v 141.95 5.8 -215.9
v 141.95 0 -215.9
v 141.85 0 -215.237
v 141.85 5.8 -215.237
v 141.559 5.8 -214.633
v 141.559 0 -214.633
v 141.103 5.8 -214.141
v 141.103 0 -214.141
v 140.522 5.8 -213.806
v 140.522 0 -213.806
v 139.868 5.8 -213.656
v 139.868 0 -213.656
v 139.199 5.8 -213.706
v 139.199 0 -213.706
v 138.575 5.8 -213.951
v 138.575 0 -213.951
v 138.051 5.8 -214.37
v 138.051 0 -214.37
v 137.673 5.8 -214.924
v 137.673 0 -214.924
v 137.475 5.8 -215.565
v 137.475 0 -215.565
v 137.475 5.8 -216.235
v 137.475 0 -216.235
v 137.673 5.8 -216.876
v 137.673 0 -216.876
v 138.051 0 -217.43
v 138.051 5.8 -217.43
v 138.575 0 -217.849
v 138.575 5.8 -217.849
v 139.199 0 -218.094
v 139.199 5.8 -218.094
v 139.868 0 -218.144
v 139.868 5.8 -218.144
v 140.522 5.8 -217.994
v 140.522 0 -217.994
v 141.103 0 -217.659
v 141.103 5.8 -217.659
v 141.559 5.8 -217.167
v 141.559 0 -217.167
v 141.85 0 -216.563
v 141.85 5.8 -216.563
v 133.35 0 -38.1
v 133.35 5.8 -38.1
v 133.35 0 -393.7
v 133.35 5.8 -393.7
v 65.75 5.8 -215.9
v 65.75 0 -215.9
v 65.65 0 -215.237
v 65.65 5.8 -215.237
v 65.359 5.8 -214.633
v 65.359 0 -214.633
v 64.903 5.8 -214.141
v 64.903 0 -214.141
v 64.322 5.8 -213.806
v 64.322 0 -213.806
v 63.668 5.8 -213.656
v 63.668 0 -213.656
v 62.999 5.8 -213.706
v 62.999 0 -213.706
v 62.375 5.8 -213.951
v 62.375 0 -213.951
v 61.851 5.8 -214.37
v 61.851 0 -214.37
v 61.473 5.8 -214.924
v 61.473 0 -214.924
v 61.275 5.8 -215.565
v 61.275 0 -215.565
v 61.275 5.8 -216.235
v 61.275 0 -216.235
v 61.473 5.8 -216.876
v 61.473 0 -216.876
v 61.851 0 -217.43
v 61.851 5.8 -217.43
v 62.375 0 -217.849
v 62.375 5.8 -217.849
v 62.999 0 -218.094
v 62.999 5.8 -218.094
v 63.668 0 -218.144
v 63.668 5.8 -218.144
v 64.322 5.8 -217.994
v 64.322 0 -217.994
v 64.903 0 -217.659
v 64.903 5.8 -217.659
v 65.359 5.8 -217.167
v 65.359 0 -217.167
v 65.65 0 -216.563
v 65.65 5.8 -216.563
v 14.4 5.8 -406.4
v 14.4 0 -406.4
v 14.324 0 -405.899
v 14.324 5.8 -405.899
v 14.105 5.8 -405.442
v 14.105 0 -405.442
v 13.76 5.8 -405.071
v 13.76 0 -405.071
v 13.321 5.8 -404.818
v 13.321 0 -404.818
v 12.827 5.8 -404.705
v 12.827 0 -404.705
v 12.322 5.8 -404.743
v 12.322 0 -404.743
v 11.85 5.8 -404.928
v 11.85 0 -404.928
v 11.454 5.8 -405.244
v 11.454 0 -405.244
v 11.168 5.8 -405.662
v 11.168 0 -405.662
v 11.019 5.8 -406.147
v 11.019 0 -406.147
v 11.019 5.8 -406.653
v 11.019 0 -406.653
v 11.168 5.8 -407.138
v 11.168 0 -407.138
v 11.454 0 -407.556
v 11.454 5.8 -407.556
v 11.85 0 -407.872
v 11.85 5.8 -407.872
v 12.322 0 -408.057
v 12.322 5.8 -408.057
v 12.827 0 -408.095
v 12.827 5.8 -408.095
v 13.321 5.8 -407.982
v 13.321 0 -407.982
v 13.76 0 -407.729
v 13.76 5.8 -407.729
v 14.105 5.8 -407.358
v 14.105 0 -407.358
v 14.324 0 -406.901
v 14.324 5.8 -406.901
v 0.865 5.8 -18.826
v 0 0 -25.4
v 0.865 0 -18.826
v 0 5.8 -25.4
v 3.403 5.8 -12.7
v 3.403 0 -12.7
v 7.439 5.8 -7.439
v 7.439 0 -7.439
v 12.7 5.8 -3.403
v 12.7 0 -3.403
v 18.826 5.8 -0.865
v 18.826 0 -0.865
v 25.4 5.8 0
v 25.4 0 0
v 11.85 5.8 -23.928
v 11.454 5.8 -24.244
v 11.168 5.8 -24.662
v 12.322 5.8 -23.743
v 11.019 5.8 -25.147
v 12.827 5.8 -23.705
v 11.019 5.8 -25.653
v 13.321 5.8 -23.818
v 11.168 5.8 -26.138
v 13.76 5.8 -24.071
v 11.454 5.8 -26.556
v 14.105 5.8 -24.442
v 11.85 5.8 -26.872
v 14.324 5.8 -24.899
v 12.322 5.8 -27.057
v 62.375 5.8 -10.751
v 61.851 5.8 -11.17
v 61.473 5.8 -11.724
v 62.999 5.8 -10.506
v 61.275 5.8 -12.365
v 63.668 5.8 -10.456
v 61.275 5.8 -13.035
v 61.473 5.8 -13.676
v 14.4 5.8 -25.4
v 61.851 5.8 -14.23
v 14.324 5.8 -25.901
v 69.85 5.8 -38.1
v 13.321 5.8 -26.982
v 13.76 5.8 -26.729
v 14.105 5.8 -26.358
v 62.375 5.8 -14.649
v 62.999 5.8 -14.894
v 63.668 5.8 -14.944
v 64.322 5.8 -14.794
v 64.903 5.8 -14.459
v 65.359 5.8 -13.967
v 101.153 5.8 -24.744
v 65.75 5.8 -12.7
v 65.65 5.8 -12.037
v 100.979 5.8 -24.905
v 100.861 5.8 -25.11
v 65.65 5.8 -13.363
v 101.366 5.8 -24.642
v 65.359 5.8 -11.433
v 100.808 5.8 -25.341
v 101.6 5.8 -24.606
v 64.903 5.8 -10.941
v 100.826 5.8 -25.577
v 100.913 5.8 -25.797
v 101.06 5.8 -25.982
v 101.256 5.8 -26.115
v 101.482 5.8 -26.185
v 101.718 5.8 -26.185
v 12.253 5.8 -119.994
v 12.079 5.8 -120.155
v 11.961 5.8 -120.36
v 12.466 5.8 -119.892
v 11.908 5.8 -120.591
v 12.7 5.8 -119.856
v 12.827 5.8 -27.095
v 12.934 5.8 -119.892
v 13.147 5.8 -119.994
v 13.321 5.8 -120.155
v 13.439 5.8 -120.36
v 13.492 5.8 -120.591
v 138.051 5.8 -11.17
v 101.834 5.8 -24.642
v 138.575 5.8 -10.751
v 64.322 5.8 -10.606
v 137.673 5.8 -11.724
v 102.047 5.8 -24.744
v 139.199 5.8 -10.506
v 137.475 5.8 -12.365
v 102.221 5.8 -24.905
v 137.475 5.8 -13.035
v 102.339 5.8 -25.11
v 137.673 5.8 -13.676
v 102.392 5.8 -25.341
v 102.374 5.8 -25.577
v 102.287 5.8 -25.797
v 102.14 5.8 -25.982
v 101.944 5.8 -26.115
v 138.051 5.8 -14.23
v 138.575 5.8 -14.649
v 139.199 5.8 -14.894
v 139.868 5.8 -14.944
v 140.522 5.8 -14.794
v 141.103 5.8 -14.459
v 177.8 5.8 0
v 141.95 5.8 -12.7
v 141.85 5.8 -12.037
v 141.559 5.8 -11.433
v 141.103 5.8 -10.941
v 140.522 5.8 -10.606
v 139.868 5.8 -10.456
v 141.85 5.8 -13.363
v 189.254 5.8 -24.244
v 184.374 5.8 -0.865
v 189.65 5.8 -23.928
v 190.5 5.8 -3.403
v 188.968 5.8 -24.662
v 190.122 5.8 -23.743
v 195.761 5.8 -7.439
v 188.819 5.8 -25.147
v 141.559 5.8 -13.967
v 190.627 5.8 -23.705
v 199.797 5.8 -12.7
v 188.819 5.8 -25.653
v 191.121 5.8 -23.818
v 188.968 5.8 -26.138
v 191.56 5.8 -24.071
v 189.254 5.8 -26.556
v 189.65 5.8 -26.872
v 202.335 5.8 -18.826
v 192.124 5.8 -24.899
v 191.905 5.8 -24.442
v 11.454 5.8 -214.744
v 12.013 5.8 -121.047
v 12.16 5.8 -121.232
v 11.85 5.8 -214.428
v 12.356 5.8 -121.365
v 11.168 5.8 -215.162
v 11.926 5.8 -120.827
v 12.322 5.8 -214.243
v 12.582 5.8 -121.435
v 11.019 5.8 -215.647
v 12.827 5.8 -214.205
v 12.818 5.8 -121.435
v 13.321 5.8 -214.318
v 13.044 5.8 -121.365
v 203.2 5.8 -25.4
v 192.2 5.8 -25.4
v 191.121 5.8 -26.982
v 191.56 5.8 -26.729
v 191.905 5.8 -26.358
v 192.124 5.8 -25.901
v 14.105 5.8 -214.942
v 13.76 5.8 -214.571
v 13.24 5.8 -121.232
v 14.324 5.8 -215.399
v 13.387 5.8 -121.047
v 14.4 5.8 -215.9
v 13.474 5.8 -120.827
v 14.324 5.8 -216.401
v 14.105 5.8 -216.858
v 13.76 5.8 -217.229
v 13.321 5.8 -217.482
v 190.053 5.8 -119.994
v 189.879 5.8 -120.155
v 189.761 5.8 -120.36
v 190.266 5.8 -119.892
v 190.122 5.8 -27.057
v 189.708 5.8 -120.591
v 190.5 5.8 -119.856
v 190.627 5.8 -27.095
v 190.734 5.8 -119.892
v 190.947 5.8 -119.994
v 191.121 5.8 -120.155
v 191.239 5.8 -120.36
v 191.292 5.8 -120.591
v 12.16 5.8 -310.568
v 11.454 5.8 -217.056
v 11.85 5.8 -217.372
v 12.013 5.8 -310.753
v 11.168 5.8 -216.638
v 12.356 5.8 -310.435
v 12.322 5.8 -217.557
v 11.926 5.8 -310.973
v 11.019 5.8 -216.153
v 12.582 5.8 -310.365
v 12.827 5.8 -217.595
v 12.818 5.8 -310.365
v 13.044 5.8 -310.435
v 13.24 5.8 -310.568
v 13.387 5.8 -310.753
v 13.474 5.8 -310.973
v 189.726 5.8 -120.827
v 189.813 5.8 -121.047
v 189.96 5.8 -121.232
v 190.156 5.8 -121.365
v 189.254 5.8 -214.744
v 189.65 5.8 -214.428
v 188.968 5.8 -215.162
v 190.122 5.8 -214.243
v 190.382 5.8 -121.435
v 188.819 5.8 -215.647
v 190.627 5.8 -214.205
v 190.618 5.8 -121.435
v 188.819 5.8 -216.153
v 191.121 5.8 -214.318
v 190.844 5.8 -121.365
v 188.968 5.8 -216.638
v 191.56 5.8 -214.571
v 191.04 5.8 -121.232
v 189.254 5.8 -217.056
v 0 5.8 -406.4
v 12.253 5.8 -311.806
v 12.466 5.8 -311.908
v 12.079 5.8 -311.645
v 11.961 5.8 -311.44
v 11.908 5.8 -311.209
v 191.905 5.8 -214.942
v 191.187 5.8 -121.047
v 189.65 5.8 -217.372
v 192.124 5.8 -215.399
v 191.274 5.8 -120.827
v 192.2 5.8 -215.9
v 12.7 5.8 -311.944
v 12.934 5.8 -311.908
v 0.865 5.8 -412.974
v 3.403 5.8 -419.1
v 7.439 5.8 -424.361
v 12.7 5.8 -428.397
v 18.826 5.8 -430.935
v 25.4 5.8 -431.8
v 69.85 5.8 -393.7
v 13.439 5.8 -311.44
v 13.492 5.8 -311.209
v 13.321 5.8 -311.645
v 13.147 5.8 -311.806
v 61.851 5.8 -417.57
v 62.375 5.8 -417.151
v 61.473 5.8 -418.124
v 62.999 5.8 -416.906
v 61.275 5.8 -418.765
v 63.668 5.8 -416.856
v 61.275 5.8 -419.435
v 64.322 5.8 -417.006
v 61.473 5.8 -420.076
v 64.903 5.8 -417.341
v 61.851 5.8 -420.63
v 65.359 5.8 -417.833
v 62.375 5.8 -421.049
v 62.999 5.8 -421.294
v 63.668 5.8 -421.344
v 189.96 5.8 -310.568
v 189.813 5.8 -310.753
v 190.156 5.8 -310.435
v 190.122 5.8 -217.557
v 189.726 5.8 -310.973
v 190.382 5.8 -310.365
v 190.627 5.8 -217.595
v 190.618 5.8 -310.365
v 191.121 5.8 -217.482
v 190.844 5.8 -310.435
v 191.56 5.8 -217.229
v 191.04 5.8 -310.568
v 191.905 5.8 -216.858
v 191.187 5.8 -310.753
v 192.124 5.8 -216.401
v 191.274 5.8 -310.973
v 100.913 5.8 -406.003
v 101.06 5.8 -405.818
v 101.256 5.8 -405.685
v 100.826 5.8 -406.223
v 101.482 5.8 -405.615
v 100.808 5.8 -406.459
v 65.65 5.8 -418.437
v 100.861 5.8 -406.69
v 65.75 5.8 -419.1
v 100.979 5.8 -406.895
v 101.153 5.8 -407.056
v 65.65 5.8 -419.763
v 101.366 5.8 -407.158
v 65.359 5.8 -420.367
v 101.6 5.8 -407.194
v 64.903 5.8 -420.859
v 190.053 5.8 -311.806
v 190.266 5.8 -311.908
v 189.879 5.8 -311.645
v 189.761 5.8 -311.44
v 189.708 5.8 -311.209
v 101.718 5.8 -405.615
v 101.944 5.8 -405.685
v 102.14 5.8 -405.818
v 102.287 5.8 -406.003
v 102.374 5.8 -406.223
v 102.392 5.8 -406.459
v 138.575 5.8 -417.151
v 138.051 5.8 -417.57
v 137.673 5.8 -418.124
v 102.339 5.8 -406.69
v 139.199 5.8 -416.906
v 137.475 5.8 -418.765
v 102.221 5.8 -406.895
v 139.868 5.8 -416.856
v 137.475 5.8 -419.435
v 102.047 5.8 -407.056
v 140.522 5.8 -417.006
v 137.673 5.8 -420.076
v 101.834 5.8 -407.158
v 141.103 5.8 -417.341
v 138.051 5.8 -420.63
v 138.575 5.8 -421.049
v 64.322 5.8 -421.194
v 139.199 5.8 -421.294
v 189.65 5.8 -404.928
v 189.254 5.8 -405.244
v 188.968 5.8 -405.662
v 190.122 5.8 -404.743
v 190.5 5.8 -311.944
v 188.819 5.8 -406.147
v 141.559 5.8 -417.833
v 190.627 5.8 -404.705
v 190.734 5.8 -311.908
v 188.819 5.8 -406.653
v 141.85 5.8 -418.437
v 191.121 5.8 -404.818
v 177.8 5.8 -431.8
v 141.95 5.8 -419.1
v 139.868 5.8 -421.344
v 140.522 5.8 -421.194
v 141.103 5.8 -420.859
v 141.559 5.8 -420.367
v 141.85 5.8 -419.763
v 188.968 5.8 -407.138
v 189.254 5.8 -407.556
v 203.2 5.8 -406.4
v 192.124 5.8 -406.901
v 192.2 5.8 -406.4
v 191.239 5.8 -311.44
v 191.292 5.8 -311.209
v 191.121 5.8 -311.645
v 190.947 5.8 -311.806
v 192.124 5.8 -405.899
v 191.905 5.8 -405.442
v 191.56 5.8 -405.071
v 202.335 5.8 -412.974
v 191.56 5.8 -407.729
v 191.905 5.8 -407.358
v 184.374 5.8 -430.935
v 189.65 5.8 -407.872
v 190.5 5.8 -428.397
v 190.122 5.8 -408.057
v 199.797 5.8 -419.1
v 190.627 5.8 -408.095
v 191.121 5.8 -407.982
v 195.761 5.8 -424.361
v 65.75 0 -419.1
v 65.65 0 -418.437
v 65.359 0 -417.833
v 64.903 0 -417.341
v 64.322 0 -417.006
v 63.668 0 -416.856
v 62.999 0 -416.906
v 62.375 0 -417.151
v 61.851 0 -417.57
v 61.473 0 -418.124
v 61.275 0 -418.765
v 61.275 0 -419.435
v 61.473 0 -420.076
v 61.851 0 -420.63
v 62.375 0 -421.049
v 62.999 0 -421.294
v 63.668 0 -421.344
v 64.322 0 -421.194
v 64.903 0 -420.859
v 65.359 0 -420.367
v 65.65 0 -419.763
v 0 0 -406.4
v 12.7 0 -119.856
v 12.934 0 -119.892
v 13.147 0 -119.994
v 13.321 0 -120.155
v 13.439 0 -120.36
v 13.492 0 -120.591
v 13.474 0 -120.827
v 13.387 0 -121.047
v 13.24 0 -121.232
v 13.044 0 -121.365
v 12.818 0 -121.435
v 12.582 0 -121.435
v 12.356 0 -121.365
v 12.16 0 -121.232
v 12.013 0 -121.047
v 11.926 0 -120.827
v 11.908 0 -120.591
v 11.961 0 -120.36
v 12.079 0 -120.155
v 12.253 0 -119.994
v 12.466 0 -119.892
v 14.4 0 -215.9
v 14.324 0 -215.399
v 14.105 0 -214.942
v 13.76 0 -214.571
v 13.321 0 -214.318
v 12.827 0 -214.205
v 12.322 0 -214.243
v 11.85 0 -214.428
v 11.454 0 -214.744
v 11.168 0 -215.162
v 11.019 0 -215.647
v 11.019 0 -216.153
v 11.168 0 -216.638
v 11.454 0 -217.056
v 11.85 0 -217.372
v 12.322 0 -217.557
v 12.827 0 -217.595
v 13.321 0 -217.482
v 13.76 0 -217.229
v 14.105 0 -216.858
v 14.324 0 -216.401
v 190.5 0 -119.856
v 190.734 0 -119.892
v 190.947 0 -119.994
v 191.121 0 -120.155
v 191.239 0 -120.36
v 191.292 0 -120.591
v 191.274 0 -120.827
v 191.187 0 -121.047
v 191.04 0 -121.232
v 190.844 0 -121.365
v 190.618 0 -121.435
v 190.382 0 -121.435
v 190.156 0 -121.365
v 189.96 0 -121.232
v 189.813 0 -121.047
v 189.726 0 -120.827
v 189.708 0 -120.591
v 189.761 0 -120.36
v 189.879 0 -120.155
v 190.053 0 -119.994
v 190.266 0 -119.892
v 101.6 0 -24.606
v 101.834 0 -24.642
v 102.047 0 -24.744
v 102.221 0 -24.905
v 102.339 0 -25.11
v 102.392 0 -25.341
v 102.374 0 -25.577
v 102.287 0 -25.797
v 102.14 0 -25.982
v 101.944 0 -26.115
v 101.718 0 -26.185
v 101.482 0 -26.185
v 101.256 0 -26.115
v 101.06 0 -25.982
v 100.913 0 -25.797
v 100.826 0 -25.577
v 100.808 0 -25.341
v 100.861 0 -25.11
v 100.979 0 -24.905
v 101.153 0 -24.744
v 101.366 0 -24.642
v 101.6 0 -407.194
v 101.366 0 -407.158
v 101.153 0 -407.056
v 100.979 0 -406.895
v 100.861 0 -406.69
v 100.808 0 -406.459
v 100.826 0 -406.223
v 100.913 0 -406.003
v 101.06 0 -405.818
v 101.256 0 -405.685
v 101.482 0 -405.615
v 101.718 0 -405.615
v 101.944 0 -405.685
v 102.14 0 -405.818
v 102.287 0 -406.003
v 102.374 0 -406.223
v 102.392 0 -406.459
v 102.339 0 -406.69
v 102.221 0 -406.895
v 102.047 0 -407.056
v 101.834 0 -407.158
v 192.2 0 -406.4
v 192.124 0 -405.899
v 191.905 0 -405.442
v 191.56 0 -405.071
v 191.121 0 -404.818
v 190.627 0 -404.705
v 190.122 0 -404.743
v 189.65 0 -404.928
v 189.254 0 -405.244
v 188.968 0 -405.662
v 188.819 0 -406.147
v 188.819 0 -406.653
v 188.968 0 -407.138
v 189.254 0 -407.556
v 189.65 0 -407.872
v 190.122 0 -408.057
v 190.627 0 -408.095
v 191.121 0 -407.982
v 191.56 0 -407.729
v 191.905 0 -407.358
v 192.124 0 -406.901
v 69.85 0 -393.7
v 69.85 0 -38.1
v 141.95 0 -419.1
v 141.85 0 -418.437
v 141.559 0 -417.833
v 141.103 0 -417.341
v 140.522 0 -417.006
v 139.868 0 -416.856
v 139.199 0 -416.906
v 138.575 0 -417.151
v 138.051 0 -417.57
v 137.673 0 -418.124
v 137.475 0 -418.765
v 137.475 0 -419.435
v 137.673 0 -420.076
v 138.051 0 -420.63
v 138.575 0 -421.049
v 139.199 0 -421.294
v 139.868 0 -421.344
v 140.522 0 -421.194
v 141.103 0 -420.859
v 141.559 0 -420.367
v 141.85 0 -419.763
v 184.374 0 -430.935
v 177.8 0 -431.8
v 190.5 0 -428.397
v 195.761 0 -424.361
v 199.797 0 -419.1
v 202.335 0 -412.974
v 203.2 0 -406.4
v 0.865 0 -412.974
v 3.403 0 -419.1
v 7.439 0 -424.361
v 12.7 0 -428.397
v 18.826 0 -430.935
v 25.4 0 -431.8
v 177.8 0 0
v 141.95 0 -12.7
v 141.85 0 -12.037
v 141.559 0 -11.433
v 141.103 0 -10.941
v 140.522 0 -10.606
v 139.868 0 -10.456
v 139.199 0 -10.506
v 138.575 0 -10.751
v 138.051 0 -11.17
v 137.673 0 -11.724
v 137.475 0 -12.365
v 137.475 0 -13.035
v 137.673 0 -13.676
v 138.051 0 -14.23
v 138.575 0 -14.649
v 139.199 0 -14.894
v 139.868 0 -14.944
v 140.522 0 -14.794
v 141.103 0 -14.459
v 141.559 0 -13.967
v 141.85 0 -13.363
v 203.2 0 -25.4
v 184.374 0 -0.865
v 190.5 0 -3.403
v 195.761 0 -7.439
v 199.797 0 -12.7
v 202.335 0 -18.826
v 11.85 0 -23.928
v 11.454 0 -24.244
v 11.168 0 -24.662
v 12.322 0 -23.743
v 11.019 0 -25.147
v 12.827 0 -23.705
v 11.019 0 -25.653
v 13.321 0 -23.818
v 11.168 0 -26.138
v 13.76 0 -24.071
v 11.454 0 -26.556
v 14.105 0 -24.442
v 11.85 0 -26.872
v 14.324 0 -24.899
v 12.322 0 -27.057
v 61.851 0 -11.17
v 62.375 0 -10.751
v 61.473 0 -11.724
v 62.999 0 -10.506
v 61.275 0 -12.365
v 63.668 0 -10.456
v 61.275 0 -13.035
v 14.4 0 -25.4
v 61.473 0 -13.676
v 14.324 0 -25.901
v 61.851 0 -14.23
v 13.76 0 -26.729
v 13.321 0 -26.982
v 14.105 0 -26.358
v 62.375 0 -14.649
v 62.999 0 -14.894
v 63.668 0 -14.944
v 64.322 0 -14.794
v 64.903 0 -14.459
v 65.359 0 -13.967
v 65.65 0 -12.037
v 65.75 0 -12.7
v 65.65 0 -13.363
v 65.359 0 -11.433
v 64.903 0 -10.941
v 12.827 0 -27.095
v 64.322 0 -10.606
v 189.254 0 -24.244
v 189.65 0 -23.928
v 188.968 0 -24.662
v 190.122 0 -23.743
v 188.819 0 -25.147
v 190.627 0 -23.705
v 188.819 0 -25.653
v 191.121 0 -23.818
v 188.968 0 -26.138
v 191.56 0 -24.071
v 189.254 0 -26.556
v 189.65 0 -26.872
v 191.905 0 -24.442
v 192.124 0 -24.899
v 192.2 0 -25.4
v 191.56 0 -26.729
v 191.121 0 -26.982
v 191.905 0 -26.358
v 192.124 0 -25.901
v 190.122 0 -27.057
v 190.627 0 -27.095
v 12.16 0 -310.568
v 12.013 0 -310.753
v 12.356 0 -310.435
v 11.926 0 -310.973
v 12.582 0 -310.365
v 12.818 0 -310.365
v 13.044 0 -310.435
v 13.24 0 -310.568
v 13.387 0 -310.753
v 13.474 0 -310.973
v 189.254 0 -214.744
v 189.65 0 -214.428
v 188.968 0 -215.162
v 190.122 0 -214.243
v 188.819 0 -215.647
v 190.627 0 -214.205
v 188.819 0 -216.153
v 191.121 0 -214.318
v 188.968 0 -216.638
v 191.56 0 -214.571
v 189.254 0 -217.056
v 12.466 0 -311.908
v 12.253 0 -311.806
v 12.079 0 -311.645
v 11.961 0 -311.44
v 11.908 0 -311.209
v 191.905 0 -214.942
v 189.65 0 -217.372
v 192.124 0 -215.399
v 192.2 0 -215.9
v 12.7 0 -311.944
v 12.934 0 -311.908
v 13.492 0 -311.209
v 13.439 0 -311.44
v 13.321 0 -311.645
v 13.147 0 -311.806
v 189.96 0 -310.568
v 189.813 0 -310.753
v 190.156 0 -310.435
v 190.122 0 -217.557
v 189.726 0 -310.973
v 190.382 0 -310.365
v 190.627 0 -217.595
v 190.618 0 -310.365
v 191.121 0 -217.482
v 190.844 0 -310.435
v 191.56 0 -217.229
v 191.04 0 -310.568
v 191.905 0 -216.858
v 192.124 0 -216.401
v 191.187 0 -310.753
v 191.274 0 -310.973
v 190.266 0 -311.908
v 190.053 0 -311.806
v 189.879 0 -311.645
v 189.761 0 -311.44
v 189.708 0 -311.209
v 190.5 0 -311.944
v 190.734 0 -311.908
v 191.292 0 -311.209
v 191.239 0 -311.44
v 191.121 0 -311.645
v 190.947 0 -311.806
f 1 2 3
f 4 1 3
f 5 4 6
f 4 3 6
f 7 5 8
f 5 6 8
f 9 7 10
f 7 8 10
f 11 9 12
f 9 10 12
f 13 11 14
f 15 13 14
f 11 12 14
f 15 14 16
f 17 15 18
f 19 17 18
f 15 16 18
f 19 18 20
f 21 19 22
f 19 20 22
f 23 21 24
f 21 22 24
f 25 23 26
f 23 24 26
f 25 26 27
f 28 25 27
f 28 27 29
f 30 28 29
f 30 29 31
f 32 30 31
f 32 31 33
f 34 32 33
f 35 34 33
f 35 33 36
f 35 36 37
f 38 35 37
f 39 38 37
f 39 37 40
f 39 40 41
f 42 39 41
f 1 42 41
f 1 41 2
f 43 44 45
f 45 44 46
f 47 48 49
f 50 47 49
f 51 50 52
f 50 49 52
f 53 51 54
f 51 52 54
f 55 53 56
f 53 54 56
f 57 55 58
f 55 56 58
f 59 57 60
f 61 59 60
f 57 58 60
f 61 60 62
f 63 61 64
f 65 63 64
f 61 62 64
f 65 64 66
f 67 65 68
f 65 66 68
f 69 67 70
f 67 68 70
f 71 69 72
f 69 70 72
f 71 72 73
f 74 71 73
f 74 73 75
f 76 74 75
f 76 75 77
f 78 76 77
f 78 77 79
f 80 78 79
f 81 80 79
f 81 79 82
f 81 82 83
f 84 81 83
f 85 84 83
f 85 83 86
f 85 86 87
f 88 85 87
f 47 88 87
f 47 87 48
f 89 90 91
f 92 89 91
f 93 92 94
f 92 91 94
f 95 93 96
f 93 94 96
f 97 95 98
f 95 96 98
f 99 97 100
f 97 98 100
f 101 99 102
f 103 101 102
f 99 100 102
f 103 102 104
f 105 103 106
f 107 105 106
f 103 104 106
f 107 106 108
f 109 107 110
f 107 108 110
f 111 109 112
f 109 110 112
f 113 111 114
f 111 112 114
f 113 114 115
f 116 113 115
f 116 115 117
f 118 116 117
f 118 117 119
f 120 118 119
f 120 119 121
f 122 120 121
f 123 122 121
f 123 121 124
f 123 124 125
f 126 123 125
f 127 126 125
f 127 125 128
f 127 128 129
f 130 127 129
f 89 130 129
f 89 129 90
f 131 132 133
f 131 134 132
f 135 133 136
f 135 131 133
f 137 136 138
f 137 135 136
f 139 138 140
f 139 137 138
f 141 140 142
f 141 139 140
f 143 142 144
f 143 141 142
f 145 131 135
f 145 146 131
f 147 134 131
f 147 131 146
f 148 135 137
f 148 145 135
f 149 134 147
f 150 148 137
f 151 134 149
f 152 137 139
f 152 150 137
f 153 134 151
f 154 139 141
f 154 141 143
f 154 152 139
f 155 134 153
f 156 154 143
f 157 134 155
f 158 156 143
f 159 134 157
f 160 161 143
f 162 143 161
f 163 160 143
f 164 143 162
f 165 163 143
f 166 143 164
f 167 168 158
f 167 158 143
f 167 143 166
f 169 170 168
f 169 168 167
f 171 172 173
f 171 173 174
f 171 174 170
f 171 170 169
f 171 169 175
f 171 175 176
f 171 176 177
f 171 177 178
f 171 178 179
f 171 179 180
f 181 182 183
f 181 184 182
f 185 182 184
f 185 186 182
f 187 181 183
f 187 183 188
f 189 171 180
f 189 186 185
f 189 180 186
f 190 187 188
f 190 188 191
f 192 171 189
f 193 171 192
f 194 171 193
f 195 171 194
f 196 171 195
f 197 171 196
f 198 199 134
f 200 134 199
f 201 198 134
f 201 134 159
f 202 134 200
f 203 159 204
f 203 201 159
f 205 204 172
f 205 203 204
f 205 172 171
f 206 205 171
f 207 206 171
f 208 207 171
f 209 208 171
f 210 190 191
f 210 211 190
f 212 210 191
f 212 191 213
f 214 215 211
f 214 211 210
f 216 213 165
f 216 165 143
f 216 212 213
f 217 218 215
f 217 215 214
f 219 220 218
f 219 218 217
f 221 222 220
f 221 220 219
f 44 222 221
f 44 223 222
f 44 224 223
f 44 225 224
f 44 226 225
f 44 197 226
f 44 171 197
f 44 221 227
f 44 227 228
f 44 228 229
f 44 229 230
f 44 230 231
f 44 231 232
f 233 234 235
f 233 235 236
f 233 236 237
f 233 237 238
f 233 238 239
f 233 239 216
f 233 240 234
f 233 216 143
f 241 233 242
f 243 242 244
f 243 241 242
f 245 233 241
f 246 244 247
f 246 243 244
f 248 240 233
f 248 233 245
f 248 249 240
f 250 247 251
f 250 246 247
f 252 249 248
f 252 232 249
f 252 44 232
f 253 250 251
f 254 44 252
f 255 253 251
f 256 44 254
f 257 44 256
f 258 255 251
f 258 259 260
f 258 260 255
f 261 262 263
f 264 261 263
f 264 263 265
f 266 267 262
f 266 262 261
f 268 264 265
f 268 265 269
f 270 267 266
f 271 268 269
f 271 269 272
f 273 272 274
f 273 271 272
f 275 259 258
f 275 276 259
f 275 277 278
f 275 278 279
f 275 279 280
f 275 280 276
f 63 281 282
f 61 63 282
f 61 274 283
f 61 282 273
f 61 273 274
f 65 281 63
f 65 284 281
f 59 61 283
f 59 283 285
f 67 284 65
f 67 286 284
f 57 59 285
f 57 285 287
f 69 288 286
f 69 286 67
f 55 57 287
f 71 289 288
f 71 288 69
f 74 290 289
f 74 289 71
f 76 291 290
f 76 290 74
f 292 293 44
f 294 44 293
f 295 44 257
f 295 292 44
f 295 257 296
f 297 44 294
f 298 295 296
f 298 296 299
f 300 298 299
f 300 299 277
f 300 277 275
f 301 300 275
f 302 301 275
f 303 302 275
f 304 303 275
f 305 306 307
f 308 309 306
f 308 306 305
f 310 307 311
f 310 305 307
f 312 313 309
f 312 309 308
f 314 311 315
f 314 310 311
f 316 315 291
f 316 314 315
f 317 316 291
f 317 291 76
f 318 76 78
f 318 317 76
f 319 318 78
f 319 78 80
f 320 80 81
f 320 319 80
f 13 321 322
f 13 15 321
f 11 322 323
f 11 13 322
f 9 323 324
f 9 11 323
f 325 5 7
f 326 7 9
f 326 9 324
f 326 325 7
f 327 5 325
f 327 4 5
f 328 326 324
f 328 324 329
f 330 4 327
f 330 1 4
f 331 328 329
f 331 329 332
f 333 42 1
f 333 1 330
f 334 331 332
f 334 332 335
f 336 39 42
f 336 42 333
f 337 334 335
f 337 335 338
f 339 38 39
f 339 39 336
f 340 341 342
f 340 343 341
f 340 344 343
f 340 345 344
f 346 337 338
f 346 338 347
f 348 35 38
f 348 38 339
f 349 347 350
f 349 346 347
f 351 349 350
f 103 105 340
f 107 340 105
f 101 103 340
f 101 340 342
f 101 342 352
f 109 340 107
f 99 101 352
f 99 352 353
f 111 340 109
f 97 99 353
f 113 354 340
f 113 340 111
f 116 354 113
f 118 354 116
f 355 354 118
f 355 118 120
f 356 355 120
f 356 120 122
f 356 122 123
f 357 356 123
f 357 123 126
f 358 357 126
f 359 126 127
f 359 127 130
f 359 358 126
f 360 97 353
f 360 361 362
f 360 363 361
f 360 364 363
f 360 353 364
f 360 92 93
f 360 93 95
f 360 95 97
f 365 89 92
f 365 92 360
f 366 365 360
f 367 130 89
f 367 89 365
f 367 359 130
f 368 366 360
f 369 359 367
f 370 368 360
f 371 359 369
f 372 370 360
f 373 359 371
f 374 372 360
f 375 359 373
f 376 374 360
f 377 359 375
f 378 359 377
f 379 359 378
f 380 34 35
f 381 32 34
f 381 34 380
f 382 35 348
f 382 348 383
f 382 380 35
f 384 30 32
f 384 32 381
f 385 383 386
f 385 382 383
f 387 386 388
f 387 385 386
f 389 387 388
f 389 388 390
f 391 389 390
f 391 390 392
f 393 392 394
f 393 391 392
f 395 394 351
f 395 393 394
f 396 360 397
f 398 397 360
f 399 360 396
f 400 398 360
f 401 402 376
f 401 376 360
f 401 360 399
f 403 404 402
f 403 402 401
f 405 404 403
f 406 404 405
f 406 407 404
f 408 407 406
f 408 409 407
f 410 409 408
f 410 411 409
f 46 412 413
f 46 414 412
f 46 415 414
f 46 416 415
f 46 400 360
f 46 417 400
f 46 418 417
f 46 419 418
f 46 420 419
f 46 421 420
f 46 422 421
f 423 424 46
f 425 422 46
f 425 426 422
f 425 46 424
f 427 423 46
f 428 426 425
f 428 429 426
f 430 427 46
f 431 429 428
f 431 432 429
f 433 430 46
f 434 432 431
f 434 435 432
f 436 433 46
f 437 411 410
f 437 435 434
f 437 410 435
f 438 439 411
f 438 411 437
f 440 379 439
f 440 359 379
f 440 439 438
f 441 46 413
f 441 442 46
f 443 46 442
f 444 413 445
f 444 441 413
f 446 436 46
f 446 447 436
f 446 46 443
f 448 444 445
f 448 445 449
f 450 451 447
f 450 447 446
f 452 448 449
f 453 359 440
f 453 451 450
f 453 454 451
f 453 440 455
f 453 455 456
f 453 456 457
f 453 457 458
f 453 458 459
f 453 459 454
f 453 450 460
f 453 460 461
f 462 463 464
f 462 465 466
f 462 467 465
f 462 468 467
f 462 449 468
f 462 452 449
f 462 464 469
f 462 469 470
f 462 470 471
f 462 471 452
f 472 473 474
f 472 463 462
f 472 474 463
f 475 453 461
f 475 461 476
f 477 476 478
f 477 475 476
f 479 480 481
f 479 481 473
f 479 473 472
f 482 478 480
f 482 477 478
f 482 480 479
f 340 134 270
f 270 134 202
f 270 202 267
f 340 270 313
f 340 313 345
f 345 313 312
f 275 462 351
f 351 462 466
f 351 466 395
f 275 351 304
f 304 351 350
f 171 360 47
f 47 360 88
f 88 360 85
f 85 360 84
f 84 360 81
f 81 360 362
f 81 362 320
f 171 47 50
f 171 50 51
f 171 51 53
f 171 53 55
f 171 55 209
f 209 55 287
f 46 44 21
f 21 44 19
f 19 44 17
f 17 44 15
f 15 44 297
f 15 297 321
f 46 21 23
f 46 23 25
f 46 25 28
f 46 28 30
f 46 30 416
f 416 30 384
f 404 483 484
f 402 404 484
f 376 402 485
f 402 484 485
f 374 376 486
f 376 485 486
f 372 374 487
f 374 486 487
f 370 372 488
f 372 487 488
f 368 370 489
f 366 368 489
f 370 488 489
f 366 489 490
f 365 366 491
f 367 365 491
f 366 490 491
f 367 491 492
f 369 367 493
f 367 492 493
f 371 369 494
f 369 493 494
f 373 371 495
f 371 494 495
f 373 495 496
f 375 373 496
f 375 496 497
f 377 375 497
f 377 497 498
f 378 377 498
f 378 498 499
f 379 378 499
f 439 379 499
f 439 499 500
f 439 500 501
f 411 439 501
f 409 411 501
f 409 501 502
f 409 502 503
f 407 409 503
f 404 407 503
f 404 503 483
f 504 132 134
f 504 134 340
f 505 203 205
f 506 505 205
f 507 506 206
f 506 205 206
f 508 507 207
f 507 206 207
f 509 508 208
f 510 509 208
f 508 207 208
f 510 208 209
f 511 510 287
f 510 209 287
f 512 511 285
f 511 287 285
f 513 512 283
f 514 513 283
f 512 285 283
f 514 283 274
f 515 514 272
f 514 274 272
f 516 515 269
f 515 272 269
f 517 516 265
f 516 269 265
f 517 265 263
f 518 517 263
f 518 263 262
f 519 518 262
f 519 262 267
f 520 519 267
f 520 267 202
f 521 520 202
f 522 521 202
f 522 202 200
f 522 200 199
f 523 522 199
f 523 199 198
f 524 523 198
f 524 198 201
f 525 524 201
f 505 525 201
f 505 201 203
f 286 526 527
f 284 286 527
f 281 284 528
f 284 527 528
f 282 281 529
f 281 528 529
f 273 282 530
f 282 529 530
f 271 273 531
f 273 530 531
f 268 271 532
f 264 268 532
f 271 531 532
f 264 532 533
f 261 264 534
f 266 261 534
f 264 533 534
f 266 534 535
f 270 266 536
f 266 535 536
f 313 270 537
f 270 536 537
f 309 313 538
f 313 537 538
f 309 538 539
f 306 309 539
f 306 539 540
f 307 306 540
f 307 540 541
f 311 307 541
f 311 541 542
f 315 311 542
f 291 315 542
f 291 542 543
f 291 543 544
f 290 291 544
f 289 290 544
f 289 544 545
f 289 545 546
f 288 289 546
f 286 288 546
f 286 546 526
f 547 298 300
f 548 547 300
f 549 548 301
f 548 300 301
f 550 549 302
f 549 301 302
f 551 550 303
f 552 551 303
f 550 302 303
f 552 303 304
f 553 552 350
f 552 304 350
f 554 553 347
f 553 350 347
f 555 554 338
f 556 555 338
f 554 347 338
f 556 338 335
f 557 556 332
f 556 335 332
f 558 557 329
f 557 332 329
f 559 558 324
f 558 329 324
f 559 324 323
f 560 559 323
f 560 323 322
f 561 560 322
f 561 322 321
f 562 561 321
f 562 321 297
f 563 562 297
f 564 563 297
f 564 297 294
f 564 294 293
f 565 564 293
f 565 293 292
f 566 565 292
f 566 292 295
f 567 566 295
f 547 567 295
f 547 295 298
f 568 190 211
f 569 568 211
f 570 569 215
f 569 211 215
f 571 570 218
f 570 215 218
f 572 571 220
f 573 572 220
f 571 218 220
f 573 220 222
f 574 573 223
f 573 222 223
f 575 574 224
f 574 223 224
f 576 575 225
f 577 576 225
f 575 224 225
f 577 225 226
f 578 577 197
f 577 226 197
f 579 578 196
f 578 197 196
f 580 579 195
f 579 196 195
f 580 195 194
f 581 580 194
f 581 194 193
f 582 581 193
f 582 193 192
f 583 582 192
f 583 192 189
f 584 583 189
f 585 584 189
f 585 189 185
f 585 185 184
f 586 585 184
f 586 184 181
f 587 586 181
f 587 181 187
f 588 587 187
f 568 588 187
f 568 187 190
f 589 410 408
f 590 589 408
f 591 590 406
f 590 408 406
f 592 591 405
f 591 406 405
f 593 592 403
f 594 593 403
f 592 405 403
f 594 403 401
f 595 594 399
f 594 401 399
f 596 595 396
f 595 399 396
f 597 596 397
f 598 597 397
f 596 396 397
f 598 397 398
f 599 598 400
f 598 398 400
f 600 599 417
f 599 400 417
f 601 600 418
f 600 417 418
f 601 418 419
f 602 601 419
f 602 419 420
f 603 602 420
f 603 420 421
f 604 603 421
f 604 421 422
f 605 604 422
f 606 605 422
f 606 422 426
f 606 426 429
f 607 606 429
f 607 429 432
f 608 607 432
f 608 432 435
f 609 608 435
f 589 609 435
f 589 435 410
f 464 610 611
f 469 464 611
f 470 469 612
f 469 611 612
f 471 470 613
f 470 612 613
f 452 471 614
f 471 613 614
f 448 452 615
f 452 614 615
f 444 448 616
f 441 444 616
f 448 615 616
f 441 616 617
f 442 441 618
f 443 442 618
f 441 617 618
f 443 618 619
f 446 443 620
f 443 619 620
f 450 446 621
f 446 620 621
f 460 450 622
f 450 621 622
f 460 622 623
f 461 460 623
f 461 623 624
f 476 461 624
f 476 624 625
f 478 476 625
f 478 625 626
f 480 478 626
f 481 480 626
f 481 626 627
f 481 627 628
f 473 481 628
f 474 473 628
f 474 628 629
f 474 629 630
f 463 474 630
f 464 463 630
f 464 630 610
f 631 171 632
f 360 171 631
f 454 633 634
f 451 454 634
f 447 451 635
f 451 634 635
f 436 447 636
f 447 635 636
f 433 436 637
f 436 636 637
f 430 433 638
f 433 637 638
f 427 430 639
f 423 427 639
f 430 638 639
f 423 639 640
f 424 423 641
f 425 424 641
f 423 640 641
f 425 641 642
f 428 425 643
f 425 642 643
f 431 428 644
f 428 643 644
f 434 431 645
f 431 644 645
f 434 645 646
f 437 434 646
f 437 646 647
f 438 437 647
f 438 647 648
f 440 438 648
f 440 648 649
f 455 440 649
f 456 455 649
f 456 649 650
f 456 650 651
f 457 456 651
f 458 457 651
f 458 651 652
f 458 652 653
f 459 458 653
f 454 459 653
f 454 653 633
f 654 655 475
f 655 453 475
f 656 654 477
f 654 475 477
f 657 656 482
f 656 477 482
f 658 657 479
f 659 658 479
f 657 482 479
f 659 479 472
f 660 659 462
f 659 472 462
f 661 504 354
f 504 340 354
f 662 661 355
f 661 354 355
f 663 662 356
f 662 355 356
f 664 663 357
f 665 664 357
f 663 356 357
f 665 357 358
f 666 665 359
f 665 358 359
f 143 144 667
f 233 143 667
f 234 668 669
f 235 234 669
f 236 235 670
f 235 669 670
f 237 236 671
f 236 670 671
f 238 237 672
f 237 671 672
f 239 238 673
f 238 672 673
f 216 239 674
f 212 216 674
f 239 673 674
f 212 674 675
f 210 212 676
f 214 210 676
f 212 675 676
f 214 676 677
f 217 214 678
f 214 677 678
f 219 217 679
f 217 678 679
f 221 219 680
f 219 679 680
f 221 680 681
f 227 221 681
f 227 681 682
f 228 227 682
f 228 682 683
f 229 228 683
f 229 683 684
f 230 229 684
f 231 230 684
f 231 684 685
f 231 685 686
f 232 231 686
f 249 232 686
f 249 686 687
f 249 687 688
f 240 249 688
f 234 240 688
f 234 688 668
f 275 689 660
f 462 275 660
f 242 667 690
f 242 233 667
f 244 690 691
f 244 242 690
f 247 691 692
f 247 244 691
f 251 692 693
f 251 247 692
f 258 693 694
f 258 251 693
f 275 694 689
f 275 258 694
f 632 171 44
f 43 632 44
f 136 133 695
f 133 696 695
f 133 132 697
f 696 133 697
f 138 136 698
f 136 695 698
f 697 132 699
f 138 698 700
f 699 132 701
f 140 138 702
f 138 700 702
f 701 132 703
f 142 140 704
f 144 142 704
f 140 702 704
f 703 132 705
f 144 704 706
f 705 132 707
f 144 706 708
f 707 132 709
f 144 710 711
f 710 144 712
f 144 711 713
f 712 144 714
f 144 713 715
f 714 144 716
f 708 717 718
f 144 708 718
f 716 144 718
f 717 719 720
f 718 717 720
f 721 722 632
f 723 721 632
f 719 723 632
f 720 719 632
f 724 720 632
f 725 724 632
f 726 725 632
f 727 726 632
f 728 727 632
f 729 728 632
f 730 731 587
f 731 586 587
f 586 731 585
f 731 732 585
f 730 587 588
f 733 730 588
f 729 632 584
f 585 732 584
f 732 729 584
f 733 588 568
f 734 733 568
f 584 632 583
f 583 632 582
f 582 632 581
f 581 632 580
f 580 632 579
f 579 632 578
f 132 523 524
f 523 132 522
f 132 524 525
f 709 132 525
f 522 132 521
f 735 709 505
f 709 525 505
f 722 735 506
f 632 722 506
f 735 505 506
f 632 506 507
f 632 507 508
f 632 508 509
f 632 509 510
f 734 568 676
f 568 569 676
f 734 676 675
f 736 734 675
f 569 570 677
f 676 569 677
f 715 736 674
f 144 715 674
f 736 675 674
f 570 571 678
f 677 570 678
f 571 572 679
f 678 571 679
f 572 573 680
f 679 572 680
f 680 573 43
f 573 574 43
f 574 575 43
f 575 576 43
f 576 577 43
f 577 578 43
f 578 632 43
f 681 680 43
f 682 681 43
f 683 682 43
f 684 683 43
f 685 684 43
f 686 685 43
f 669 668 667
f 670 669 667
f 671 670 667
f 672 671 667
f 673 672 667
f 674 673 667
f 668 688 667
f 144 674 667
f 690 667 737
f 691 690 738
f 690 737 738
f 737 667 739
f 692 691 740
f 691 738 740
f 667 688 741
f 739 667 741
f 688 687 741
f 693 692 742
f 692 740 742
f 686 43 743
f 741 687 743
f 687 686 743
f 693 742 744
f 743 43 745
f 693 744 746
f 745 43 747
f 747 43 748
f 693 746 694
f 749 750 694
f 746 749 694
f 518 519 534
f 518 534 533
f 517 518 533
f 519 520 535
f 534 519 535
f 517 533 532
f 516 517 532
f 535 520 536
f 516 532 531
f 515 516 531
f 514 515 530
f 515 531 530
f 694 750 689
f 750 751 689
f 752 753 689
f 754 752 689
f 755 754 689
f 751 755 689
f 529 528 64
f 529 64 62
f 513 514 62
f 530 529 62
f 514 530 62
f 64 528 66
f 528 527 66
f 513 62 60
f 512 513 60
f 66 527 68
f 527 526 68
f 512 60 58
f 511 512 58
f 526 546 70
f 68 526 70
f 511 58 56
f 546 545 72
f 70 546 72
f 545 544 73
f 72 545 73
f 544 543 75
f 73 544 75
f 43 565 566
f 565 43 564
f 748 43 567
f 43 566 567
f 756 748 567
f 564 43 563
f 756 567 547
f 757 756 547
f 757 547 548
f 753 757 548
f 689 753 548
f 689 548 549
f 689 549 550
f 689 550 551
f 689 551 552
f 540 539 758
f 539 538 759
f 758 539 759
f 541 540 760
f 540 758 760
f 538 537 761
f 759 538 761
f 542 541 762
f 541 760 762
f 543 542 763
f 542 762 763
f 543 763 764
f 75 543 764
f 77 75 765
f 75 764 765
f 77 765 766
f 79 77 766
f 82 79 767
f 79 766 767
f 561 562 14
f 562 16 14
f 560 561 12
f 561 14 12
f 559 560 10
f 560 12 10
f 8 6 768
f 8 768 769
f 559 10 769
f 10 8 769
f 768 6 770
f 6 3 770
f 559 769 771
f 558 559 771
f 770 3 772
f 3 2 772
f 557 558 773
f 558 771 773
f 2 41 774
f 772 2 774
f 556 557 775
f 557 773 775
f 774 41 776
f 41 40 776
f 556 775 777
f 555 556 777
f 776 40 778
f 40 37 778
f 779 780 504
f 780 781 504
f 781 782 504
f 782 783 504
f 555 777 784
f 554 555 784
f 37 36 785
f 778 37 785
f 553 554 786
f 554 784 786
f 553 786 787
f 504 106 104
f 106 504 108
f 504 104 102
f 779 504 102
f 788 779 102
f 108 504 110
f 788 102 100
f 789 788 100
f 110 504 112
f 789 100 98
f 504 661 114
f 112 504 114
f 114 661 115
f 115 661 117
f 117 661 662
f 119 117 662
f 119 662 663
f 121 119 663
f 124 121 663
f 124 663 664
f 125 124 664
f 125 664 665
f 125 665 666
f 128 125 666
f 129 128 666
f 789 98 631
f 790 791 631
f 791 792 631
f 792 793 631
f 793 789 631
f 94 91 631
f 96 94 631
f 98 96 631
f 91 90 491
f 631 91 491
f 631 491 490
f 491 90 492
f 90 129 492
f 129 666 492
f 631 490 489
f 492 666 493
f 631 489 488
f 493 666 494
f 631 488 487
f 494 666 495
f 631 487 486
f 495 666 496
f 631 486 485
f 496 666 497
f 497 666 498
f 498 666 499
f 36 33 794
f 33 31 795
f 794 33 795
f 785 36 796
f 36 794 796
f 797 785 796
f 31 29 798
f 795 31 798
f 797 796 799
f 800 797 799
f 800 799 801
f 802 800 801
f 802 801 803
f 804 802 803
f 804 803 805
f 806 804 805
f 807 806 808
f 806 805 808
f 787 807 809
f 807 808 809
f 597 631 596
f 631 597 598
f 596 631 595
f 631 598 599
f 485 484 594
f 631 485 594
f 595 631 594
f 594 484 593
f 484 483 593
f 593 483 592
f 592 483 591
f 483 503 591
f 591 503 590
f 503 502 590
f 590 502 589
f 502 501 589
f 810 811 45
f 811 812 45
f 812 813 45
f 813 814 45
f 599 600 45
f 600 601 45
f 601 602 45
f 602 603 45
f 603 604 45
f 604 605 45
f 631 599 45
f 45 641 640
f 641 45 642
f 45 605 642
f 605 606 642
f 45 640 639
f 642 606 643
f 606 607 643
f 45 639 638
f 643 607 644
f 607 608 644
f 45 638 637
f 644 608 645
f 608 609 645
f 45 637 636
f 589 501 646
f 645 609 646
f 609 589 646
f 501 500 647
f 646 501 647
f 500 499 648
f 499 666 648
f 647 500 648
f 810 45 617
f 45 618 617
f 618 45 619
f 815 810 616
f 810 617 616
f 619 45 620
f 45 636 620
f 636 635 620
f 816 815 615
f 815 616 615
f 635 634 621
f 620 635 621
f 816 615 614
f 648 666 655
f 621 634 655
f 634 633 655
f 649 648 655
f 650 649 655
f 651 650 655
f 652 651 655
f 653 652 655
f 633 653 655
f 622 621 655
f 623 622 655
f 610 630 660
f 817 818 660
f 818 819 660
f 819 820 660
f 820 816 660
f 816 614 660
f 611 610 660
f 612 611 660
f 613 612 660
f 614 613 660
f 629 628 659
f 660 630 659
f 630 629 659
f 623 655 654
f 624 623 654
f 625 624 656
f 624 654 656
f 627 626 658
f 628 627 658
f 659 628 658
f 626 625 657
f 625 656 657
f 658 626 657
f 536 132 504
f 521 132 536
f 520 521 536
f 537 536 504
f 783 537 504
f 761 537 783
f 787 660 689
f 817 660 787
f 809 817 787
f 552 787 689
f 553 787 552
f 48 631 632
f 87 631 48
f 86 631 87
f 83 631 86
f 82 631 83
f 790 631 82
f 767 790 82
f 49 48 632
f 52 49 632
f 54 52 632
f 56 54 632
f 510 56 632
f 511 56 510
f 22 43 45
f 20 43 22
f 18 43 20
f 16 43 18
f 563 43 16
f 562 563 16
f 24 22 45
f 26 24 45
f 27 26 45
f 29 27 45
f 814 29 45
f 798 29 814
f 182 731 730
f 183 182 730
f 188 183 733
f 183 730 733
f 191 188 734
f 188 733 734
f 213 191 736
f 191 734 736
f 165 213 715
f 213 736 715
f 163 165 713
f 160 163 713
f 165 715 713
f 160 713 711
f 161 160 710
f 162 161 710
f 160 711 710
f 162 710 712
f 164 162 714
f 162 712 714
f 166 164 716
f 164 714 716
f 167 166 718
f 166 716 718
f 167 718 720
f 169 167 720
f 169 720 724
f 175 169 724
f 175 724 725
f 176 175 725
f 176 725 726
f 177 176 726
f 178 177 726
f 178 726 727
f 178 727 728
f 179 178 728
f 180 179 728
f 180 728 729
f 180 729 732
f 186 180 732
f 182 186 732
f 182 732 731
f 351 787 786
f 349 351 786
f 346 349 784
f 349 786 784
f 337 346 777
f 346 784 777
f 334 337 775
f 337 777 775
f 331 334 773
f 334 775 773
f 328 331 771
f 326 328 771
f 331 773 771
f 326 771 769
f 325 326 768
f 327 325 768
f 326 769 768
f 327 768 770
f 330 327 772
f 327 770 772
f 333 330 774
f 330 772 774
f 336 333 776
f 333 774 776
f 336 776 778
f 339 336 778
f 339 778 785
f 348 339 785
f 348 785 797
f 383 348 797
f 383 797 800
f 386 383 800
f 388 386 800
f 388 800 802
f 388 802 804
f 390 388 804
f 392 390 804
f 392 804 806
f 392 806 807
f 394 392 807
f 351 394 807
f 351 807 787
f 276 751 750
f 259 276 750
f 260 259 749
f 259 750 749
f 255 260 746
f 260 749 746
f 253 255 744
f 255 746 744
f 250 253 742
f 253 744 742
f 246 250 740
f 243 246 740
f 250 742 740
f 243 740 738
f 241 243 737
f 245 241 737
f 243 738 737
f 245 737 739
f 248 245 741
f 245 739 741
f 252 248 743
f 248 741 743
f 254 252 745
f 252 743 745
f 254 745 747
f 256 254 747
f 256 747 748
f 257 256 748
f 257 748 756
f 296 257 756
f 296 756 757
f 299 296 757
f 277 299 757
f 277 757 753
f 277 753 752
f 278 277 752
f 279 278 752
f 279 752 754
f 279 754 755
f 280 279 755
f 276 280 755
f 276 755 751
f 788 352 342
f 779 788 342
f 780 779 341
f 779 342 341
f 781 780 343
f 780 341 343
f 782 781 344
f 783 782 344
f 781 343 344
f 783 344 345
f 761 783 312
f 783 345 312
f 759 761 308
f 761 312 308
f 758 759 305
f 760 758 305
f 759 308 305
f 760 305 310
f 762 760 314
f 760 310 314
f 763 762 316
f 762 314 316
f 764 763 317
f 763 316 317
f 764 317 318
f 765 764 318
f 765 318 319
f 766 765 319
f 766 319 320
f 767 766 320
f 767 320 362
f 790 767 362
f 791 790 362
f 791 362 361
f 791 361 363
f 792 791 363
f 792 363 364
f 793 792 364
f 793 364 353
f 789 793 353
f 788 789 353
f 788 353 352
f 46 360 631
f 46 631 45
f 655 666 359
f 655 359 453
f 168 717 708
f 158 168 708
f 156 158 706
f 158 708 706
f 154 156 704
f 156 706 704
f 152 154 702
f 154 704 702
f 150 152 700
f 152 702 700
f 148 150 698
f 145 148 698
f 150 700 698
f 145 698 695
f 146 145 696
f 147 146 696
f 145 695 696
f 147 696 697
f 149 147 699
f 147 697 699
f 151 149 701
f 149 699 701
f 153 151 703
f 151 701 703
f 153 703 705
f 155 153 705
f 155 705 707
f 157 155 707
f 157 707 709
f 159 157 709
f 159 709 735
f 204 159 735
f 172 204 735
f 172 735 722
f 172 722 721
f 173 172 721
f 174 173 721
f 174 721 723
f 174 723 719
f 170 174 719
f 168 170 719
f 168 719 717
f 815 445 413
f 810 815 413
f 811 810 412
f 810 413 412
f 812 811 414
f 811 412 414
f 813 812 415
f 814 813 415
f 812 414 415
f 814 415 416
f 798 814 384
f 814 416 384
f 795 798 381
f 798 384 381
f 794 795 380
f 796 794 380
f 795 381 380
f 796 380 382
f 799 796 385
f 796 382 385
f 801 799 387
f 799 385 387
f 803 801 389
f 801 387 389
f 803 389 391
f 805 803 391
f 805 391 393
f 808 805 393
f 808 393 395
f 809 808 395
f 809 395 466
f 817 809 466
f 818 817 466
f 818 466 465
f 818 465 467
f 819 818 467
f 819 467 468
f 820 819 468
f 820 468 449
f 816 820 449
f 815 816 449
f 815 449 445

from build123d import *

# Parameters (mm, degrees)
SKETCH1_W                = 203.2
SKETCH1_H                = 431.8
BOSS_EXTRUDE1_DEPTH      = 5.8
M4_CLEARANCE_HOLE1_D     = 4.5
M4_CLEARANCE_HOLE1_DEPTH = 12.7
M4_CLEARANCE_HOLE1_TIP   = 1.351936393
SKETCH7_W                = 63.5
SKETCH7_H                = 355.6
CUT_EXTRUDE2_DEPTH       = 478.257917692
FILLET1_R                = 25.4
M3_CLEARANCE_HOLE1_D     = 3.4
M3_CLEARANCE_HOLE1_DEPTH = 12.7
M3_CLEARANCE_HOLE1_TIP   = 1.021463052
SKETCH10_R               = 0.79375
CUT_EXTRUDE3_DEPTH       = 478.257917692


with BuildPart() as part:
    # Sketch1 → Boss-Extrude1 (new body)
    with BuildSketch(Plane(origin=(0, 0, 0), x_dir=(1, 0, 0), z_dir=(0, 1, 0))):
        with Locations((101.6, 215.9)):
            Rectangle(SKETCH1_W, SKETCH1_H)
    extrude(amount=BOSS_EXTRUDE1_DEPTH)

    # M4 Clearance Hole1
    with Locations(Plane(origin=(0, 5.8, 0), x_dir=(-1, 0, 0), z_dir=(0, 1, 0))):
        with Locations((-63.5, -419.1), (-139.7, -419.1), (-63.5, -215.9), (-139.7, -215.9), (-63.5, -12.7), (-139.7, -12.7)):
            Hole(M4_CLEARANCE_HOLE1_D / 2, depth=M4_CLEARANCE_HOLE1_DEPTH)
            with Locations((0, 0, -(M4_CLEARANCE_HOLE1_DEPTH + M4_CLEARANCE_HOLE1_TIP / 2))):  # 118° drill point
                Cone(0, M4_CLEARANCE_HOLE1_D / 2, M4_CLEARANCE_HOLE1_TIP, mode=Mode.SUBTRACT)

    # Sketch7 → Cut-Extrude2 (cut, through all)
    with BuildSketch(Plane(origin=(0, 5.8, 0), x_dir=(1, 0, 0), z_dir=(0, 1, 0))):
        with Locations((101.6, 215.9)):
            Rectangle(SKETCH7_W, SKETCH7_H)
    extrude(amount=-CUT_EXTRUDE2_DEPTH, mode=Mode.SUBTRACT)

    # Fillet1
    fillet1_edges = [part.edges().sort_by_distance(p)[0] for p in [
        (0, 2.9, -431.8),
        (203.2, 2.9, -431.8),
        (203.2, 2.9, 0),
        (0, 2.9, 0),
    ]]
    fillet(fillet1_edges, radius=FILLET1_R)

    # M3 Clearance Hole1
    with Locations(Plane(origin=(0, 5.8, 0), x_dir=(-1, 0, 0), z_dir=(0, 1, 0))):
        with Locations((-190.5, -406.4), (-190.5, -25.4), (-12.7, -25.4), (-12.7, -406.4), (-190.5, -215.9), (-12.7, -215.9)):
            Hole(M3_CLEARANCE_HOLE1_D / 2, depth=M3_CLEARANCE_HOLE1_DEPTH)
            with Locations((0, 0, -(M3_CLEARANCE_HOLE1_DEPTH + M3_CLEARANCE_HOLE1_TIP / 2))):  # 118° drill point
                Cone(0, M3_CLEARANCE_HOLE1_D / 2, M3_CLEARANCE_HOLE1_TIP, mode=Mode.SUBTRACT)

    # Sketch10 → Cut-Extrude3 (cut, through all)
    with BuildSketch(Plane(origin=(0, 5.8, 0), x_dir=(-1, 0, 0), z_dir=(0, 1, 0))):
        with Locations(Location((-190.5, -120.65, 0), (0, 0, 90))):
            Circle(SKETCH10_R)
        with Locations(Location((-12.7, -120.65, 0), (0, 0, 90))):
            Circle(SKETCH10_R)
        with Locations(Location((-101.6, -25.4, 0), (0, 0, 90))):
            Circle(SKETCH10_R)
        with Locations(Location((-101.6, -406.4, 0), (0, 0, 270))):
            Circle(SKETCH10_R)
        with Locations(Location((-12.7, -311.15, 0), (0, 0, 270))):
            Circle(SKETCH10_R)
        with Locations(Location((-190.5, -311.15, 0), (0, 0, 270))):
            Circle(SKETCH10_R)
    extrude(amount=-CUT_EXTRUDE3_DEPTH, mode=Mode.SUBTRACT)


solid = part.part
